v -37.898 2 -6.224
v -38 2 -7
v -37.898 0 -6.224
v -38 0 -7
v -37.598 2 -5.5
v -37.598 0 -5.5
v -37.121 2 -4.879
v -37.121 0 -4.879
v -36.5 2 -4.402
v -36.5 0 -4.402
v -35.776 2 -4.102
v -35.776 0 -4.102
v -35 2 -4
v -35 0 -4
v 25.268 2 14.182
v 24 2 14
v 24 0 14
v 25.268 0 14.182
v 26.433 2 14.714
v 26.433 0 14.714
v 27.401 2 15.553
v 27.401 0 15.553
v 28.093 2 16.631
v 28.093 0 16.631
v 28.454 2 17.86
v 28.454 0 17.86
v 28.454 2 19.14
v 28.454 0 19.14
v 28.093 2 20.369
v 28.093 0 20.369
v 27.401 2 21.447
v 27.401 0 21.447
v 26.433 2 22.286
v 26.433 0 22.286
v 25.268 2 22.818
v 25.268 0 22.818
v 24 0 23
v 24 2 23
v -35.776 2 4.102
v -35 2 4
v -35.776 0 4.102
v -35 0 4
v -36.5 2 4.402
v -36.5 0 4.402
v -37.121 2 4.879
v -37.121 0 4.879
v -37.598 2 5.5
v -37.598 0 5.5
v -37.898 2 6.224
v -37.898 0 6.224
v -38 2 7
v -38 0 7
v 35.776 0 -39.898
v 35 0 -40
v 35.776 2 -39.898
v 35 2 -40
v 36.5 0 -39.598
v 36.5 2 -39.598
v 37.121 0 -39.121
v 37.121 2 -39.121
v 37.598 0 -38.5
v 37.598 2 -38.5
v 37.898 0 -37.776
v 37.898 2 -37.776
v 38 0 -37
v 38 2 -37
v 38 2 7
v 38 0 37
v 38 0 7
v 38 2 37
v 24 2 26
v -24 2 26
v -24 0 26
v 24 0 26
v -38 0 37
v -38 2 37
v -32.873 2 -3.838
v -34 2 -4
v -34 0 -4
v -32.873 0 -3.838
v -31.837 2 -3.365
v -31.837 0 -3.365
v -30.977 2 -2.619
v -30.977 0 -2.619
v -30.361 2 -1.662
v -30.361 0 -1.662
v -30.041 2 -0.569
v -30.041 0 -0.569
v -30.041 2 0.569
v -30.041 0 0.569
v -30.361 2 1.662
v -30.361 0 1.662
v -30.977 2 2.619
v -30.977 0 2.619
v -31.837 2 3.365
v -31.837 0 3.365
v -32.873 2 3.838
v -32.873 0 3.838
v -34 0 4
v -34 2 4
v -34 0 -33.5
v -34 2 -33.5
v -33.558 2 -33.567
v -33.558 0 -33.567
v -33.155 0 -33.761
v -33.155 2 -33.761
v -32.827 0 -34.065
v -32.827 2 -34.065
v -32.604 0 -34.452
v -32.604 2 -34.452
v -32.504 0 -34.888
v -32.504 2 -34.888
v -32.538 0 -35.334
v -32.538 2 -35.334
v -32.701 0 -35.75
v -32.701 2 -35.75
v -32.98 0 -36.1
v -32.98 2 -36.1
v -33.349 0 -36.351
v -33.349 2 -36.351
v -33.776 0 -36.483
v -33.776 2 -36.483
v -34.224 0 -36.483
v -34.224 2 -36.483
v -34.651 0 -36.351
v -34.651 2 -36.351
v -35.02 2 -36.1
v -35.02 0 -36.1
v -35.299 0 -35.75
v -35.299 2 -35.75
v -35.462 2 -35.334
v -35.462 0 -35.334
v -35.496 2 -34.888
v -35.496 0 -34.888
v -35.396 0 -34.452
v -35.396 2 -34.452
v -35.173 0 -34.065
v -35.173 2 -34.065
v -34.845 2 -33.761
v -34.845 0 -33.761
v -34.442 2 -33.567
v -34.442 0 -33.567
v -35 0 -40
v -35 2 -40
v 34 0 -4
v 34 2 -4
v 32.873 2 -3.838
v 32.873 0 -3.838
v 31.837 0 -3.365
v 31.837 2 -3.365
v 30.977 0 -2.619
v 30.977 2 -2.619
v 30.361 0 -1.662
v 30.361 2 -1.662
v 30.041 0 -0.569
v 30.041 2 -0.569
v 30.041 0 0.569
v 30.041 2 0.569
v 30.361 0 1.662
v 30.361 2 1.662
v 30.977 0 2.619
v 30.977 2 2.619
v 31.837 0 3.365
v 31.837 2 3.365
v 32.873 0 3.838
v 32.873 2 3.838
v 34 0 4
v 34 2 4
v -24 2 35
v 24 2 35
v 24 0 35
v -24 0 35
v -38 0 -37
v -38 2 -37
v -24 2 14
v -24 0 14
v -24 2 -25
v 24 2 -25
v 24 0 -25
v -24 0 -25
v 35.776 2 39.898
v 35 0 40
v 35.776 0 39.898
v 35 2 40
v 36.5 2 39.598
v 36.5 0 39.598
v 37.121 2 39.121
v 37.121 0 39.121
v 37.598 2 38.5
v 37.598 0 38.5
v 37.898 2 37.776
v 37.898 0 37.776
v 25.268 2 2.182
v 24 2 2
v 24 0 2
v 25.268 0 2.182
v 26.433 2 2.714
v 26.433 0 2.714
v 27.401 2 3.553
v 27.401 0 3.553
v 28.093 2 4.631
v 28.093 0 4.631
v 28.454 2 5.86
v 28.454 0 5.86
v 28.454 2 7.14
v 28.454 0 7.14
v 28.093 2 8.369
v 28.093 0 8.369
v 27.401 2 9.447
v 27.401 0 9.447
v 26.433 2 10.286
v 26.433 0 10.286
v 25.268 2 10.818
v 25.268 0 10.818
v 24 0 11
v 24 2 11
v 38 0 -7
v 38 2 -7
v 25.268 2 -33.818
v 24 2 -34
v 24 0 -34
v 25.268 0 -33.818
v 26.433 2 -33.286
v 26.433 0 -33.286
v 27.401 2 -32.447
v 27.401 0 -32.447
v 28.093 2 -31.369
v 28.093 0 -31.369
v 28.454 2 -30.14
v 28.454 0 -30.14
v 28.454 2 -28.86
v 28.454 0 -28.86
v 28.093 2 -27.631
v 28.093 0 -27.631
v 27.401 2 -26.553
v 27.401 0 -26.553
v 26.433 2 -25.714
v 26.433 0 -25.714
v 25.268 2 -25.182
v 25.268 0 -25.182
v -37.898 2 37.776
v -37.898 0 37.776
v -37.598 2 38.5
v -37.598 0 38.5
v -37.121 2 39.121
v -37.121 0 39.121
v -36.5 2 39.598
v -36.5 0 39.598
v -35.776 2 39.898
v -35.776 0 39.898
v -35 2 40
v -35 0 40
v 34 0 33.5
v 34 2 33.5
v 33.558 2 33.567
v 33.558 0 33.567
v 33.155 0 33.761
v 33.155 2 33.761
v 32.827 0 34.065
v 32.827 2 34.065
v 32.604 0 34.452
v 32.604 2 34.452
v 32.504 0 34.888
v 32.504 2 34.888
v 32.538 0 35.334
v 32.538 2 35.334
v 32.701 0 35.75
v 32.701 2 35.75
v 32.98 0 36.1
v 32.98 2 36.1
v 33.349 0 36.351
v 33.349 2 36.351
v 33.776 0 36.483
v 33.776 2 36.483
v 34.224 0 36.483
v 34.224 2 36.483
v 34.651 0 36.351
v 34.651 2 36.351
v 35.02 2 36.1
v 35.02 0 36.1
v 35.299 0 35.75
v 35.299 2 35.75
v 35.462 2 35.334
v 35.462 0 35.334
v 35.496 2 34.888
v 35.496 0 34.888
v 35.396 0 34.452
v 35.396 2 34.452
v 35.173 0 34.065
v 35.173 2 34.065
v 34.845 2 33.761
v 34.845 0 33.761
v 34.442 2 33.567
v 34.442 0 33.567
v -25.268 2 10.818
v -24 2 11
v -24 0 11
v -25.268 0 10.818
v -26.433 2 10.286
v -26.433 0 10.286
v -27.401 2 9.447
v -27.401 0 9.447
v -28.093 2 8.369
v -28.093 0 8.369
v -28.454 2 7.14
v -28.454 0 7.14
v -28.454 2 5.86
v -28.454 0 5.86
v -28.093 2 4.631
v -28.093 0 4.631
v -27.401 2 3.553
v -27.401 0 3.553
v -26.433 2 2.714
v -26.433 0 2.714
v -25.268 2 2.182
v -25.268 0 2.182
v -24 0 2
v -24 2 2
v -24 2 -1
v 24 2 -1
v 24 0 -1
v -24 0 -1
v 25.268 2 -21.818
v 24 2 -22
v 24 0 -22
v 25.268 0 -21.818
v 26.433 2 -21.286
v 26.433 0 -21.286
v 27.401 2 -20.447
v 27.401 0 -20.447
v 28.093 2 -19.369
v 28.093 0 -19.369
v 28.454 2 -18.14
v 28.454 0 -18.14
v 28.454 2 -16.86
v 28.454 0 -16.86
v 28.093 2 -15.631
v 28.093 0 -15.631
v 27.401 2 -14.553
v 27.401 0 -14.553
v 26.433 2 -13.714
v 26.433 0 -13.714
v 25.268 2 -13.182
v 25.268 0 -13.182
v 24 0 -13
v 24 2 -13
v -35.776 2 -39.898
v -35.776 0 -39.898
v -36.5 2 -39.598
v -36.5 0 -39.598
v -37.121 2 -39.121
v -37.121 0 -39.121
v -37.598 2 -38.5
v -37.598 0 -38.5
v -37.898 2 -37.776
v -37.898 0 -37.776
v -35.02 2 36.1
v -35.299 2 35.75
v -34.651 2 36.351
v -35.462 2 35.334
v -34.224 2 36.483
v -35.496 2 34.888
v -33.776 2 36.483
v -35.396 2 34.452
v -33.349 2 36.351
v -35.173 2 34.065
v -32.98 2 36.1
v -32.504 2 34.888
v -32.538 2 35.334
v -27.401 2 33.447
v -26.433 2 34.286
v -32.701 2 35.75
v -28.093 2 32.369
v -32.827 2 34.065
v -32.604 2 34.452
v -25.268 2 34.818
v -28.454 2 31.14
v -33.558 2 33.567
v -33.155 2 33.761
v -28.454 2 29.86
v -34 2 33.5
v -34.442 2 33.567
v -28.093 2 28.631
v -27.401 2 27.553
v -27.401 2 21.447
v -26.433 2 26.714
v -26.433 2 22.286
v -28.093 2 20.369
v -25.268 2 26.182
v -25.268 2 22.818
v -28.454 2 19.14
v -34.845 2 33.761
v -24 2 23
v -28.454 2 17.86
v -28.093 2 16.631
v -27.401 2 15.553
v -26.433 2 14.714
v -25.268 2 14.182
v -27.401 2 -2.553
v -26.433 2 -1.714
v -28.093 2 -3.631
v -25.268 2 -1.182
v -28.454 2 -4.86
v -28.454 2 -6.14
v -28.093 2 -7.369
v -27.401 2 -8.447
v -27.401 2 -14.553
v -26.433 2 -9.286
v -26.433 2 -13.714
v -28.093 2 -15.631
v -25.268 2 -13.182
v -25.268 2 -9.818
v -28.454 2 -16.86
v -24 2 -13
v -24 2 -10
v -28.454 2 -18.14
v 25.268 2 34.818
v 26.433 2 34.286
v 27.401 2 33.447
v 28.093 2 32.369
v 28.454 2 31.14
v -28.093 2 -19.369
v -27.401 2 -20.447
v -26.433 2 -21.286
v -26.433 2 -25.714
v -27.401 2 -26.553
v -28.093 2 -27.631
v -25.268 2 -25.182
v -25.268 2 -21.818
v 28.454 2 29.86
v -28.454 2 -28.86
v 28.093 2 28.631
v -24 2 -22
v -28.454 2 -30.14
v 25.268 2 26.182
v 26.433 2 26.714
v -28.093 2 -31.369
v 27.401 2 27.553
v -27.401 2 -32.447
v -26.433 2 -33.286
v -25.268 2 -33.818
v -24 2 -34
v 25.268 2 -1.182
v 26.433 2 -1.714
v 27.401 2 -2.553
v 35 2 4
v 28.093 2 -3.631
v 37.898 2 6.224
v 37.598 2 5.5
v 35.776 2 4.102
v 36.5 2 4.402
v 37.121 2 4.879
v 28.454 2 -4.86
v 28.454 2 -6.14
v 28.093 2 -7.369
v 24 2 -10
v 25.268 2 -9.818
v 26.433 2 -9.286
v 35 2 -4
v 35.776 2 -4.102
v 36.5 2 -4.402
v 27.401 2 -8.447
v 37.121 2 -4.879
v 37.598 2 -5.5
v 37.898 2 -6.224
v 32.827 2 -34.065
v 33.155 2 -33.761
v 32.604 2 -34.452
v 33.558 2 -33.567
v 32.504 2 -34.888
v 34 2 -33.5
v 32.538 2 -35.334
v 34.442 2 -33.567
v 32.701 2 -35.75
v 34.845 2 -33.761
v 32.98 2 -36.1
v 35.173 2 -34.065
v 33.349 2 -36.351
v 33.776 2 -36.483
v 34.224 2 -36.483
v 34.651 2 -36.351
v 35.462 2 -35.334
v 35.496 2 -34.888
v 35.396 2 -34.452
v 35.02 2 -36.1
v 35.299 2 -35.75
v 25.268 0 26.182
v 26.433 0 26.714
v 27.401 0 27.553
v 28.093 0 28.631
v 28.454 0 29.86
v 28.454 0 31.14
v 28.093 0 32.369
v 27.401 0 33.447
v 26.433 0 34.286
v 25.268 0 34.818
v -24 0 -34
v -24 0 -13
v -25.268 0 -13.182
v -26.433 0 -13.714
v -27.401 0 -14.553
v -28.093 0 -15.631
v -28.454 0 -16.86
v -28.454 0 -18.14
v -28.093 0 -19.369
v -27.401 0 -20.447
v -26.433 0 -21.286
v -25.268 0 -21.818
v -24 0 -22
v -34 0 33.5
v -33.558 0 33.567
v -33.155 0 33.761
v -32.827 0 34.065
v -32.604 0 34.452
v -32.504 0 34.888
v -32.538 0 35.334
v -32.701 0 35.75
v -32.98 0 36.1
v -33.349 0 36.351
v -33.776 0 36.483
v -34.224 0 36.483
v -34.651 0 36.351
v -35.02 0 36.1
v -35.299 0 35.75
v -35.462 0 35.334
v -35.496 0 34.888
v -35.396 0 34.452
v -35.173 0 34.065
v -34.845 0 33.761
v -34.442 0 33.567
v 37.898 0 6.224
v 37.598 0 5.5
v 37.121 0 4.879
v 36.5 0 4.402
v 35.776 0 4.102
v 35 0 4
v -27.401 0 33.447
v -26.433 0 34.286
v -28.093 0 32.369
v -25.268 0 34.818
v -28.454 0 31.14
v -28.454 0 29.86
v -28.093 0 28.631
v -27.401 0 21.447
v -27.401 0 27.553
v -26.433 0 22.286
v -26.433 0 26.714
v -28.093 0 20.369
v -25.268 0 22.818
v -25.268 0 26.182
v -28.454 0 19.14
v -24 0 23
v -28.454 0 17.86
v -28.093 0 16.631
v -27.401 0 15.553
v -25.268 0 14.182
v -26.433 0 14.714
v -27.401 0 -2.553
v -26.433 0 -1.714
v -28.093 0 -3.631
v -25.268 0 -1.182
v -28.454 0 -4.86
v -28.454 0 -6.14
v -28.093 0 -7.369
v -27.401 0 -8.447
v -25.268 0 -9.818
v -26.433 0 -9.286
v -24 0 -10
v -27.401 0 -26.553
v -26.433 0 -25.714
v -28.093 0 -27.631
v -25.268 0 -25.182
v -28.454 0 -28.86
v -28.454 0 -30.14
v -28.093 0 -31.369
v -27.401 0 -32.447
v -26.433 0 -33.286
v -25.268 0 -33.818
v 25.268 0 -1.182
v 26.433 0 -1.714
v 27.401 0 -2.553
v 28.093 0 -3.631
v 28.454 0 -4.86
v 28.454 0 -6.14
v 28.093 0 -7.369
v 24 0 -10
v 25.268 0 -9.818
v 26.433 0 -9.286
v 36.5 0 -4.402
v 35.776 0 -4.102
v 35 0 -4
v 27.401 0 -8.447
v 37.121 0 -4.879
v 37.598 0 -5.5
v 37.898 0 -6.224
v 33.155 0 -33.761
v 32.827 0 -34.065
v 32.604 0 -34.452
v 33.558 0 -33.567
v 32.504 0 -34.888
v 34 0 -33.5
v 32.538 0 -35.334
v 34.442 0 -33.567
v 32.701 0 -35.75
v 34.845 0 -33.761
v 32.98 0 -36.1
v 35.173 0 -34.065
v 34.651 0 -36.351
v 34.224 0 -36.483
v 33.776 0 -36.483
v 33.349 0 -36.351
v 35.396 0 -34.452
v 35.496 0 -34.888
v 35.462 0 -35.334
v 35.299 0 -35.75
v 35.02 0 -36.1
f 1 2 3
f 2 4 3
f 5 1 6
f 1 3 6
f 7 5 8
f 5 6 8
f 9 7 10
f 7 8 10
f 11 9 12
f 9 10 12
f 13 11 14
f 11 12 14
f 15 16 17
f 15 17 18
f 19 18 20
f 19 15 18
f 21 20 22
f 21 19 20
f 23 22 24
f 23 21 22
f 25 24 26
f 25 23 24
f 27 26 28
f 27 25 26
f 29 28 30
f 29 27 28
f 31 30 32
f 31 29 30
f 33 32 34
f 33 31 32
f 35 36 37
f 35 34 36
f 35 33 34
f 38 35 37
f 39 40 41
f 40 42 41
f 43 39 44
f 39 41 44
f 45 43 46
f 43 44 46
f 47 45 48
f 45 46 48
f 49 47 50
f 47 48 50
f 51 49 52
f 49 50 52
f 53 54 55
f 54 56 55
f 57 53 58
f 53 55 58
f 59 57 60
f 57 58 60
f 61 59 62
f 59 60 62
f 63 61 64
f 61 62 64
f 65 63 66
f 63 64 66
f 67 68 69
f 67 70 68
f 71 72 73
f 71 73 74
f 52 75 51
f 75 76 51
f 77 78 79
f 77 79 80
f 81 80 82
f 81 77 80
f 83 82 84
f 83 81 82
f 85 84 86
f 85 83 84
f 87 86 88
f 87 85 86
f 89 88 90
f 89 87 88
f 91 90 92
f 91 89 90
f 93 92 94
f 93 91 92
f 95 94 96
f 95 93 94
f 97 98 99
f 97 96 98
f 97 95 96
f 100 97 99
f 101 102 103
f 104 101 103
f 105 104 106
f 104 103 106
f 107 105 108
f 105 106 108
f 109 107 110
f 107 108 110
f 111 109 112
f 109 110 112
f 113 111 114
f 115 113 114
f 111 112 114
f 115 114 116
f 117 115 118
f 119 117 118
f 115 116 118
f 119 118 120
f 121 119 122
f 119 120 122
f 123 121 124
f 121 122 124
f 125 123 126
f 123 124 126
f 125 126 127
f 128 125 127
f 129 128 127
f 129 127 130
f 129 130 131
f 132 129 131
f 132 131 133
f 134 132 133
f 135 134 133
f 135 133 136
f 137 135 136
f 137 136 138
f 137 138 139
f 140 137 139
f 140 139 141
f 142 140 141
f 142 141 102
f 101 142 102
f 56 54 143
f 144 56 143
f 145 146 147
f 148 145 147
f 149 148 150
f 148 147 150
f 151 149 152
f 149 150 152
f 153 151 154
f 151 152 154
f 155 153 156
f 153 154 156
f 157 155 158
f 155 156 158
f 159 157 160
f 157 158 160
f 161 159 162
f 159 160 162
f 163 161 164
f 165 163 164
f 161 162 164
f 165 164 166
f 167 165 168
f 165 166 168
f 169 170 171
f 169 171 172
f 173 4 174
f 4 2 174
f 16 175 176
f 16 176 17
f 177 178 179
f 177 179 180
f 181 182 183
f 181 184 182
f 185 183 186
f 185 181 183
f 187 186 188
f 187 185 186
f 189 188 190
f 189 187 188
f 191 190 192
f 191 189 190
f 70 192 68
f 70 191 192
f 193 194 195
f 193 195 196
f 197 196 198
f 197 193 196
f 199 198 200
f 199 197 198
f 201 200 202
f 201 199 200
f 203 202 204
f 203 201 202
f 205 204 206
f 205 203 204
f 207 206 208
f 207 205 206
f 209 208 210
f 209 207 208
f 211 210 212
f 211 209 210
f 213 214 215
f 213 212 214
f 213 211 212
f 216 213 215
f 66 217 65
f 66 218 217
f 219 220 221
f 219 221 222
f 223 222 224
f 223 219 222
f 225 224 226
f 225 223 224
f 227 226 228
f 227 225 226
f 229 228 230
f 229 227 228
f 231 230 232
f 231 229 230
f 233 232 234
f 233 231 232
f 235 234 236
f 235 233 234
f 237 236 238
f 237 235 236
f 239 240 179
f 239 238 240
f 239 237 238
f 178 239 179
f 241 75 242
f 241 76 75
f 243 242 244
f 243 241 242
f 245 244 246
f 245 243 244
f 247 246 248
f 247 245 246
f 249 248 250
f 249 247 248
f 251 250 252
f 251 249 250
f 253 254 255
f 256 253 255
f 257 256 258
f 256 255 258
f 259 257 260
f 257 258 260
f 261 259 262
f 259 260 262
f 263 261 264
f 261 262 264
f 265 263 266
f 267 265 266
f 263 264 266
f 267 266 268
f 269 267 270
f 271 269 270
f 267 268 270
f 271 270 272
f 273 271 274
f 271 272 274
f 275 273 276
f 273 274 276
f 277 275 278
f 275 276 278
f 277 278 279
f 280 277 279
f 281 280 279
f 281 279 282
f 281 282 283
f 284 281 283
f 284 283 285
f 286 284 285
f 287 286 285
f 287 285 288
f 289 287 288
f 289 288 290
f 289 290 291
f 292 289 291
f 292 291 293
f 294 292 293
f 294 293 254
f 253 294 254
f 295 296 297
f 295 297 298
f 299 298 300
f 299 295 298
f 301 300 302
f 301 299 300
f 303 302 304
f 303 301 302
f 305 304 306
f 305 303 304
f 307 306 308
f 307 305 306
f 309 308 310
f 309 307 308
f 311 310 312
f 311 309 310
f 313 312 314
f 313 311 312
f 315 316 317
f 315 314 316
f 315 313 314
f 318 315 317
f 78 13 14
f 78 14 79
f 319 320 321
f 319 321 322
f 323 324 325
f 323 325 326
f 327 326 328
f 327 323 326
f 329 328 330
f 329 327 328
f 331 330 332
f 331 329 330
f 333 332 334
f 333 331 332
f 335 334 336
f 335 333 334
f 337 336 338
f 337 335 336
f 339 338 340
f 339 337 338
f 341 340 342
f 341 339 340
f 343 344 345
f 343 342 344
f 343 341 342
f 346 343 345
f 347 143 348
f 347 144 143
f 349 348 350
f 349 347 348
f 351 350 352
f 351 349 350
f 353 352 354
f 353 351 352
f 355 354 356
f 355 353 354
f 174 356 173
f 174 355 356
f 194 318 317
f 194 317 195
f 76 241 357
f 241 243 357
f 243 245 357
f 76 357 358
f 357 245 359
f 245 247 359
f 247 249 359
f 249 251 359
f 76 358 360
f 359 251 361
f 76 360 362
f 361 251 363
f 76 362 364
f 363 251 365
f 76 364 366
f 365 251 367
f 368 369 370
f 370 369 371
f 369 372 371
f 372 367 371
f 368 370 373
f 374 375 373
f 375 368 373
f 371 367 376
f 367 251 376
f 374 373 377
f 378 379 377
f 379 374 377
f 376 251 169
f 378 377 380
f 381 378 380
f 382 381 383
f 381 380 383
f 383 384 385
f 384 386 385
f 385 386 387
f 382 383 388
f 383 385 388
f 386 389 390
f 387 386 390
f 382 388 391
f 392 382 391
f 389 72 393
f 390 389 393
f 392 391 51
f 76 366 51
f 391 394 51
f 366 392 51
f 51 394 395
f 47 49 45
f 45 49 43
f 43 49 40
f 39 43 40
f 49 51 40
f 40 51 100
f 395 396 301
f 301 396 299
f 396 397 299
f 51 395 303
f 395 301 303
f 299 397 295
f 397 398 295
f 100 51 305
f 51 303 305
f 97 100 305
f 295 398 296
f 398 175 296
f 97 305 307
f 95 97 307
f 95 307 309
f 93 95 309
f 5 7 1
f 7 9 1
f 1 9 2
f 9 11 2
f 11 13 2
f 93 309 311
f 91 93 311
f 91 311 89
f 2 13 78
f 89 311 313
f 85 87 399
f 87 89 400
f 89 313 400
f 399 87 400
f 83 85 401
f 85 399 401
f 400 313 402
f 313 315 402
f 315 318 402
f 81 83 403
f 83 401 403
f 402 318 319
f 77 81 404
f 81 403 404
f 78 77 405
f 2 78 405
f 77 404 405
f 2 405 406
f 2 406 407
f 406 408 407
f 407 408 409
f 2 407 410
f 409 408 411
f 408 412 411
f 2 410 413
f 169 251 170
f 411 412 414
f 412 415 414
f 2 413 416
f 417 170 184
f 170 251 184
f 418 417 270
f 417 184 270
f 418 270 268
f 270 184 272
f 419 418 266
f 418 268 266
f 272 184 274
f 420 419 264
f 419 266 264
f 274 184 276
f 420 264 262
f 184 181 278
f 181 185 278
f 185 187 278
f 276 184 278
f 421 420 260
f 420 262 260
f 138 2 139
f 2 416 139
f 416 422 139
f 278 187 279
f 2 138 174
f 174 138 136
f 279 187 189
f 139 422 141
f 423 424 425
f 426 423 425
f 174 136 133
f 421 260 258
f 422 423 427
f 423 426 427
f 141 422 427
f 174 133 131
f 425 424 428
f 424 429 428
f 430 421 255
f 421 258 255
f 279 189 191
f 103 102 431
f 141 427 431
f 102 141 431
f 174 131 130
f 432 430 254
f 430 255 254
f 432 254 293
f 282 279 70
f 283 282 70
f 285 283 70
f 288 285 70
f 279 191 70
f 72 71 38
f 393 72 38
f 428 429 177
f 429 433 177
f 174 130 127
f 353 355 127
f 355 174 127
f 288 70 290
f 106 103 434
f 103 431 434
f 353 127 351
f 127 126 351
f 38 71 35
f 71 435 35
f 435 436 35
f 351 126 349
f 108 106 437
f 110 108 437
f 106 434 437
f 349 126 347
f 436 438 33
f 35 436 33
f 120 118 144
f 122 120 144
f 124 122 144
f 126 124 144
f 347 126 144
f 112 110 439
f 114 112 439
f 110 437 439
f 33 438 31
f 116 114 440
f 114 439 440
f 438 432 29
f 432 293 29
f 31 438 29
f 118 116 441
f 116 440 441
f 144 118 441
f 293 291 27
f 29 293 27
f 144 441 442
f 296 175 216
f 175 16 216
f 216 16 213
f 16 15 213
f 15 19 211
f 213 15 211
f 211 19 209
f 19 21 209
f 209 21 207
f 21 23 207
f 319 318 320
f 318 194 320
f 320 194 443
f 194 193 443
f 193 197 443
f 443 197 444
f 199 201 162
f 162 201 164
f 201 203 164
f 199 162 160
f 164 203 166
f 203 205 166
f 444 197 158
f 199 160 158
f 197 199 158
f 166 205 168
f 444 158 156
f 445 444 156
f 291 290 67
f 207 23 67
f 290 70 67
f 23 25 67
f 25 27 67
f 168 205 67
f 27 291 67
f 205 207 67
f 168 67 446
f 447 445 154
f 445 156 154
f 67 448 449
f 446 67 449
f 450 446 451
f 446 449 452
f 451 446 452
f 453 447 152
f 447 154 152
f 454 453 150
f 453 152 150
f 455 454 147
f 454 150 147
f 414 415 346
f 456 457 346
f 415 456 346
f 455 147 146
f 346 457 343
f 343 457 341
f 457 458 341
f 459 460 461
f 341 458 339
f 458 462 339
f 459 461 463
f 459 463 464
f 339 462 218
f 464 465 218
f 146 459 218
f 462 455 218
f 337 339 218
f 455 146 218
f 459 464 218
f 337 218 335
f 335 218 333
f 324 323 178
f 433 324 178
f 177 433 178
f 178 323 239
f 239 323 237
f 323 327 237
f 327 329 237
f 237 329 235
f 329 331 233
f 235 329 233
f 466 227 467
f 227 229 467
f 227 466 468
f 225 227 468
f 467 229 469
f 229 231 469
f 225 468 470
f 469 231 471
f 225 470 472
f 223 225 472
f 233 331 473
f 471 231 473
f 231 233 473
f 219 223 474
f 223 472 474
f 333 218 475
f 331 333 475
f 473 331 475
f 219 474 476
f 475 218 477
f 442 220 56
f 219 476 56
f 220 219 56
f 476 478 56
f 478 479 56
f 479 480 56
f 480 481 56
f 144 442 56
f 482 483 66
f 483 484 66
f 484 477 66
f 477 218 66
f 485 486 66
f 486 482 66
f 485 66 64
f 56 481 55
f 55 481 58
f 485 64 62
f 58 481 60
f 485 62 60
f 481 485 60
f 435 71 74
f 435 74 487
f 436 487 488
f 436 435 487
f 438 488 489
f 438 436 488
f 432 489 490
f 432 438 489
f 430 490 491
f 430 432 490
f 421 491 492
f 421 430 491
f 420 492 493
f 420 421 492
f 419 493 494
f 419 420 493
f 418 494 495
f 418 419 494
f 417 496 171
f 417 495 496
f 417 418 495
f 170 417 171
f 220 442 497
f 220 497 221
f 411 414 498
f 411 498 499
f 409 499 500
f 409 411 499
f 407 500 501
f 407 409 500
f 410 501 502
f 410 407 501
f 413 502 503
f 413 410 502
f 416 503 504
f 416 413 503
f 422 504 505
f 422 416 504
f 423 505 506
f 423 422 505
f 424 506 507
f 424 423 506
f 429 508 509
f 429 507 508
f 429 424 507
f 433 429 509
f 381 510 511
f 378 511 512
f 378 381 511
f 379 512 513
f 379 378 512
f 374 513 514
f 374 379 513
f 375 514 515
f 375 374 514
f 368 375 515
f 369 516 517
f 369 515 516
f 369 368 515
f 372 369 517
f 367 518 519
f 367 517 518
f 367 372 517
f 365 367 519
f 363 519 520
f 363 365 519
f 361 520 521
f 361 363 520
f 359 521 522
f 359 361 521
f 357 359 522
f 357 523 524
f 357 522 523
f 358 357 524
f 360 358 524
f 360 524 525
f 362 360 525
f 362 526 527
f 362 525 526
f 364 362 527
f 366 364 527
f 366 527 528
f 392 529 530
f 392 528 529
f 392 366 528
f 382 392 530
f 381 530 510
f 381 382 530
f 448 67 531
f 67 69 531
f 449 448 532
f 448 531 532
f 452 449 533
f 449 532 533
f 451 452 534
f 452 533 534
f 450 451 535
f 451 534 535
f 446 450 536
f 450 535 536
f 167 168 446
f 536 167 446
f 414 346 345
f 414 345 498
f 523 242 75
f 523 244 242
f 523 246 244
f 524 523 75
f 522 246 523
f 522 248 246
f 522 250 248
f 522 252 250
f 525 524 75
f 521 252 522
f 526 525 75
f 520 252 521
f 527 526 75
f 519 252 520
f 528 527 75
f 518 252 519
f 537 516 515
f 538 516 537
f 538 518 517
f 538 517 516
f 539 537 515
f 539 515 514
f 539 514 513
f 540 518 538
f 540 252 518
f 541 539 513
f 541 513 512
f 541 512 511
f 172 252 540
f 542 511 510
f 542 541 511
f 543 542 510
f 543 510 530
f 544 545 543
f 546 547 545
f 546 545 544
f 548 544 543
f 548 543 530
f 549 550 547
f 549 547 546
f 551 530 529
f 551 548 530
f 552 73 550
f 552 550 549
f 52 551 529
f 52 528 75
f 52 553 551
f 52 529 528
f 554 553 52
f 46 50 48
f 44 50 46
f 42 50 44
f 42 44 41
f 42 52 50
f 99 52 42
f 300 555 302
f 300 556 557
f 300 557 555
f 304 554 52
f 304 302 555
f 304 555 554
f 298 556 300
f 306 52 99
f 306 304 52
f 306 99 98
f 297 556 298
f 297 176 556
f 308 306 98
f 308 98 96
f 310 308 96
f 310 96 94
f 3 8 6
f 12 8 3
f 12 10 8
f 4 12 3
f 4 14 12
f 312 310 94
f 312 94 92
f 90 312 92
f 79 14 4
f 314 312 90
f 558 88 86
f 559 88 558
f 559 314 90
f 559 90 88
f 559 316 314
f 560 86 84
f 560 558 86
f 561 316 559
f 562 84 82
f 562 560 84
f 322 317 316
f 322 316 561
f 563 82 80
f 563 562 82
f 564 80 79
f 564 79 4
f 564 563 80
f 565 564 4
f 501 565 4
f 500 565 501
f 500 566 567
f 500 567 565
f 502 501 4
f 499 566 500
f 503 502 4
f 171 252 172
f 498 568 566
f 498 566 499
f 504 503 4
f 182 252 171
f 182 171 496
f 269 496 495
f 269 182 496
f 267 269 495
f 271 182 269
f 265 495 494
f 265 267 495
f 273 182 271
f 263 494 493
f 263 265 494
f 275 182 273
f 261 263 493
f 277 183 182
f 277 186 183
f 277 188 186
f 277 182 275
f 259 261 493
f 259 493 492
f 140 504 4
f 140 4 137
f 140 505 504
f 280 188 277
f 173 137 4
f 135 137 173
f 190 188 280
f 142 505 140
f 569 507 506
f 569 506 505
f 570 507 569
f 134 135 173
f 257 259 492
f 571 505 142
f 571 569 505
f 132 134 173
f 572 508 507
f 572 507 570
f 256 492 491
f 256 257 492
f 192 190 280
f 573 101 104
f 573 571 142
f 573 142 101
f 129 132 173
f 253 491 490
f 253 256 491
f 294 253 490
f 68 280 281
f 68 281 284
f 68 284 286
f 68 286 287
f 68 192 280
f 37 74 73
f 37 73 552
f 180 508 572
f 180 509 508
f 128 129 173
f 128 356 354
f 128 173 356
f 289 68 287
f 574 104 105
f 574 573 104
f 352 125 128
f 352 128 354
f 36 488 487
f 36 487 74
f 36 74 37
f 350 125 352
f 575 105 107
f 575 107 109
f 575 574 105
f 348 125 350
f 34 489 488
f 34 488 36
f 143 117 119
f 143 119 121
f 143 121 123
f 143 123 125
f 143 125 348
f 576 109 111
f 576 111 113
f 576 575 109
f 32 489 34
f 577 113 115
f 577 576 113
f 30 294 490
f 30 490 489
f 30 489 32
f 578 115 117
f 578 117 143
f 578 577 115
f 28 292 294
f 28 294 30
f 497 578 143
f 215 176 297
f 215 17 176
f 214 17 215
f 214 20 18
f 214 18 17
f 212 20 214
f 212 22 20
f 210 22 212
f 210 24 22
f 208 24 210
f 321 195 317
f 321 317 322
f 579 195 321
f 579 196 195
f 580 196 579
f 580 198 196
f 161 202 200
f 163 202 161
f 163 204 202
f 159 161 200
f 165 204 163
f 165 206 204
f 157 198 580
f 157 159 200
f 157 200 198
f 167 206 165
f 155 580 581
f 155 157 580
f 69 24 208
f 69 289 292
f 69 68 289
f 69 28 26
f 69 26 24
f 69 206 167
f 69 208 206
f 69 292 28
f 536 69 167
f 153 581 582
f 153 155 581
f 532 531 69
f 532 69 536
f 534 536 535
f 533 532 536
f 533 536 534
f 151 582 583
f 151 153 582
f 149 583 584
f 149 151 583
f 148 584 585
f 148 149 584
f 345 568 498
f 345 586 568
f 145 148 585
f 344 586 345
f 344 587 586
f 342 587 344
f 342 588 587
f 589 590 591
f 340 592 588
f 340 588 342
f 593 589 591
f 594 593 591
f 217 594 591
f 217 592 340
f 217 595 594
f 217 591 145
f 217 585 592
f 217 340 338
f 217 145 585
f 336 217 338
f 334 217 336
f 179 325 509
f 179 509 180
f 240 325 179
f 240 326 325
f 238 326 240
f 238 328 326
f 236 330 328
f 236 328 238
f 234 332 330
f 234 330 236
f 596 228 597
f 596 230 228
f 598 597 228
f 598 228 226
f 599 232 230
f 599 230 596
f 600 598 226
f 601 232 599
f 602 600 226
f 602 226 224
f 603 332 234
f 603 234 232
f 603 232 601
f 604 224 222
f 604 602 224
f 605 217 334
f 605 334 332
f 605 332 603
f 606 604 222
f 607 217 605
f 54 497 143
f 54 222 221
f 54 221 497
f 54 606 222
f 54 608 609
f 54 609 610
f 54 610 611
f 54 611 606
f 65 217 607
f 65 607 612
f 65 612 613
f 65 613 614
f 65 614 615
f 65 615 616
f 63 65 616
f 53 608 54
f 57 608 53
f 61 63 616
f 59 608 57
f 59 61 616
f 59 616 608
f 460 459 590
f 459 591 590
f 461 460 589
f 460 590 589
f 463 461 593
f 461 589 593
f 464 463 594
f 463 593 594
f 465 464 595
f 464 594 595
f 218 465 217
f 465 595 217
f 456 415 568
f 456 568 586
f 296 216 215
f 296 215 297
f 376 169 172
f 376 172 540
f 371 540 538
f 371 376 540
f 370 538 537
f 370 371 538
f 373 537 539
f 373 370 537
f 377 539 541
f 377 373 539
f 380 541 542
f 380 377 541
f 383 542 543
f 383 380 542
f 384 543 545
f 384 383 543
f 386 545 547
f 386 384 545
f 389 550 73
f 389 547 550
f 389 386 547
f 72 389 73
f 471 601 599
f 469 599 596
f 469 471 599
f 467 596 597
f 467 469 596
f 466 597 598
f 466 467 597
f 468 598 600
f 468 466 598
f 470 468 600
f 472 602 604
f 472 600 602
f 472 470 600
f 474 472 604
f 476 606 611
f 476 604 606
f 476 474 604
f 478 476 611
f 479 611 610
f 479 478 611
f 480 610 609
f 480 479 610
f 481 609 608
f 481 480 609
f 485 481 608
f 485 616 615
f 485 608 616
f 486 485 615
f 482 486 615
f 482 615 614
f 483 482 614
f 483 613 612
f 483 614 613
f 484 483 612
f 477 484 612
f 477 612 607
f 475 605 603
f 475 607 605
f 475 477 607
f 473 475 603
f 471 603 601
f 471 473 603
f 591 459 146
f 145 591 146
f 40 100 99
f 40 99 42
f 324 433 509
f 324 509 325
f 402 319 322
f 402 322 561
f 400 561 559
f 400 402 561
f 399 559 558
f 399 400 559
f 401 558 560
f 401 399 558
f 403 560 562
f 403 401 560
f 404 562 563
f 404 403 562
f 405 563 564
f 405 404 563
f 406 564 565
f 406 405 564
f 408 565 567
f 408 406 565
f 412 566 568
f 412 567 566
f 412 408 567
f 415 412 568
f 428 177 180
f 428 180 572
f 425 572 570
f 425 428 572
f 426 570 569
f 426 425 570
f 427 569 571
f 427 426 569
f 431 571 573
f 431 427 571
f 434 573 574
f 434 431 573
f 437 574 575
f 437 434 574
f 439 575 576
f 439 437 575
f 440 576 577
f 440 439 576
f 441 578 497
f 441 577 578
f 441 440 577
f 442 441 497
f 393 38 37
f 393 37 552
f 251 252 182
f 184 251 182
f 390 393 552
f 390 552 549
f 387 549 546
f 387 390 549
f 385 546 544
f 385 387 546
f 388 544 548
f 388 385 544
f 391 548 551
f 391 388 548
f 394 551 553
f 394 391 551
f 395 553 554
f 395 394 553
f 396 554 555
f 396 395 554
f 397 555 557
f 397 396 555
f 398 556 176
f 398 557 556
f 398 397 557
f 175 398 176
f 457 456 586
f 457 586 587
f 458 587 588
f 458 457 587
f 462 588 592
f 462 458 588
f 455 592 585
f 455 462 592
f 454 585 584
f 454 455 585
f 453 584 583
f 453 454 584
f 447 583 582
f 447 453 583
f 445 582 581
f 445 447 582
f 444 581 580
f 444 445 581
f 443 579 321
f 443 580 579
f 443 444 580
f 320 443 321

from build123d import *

# Parameters (mm, degrees)
EXTRUDE_1_DEPTH          = 2
SKETCH_2_R               = 1.5
CUT_EXTRUDE_1_DEPTH      = 56.208694967
MIRROR_2_COPY_1_SKETCH_R = 1.5
MIRROR_2_COPY_1_DEPTH    = 56.208694967
CUT_EXTRUDE_2_DEPTH      = 56.208694967
PATTERN_LINEAR_1_COUNT   = 6
PATTERN_LINEAR_1_PITCH   = 12
SKETCH_4_W               = 60
SKETCH_4_H               = 2
EXTRUDE_2_DEPTH          = 8
CUT_EXTRUDE_3_DEPTH      = 56.208694967
FILLET_1_R               = 3


with BuildPart() as part:
    # 草图1 → 凸台-拉伸1 (new body)
    with BuildSketch(Plane(origin=(0, 0, 0), x_dir=(1, 0, 0), z_dir=(0, 1, 0))):
        Polygon((-38, -30), (-38, -40), (38, -40), (38, -30), (30, -30), (30, 30), (38, 30), (38, 40), (-38, 40), (-38, 30), (-30, 30), (-30, -30), align=None)
    extrude(amount=EXTRUDE_1_DEPTH)

    # 草图2 → 切除-拉伸1 (cut, through all)
    with BuildSketch(Plane(origin=(0, 2, 0), x_dir=(1, 0, 0), z_dir=(0, 1, 0))):
        with Locations(Location((-34, 35, 0), (0, 0, 270))):
            Circle(SKETCH_2_R)
    cut_extrude_1 = extrude(amount=-CUT_EXTRUDE_1_DEPTH, mode=Mode.SUBTRACT)

    # 镜向1: 切除-拉伸1 across plane
    add(cut_extrude_1.mirror(Plane(origin=(0, 0, 0), x_dir=(0, 0, 1), z_dir=(1, 0, 0))), mode=Mode.SUBTRACT)

    # 镜向2: 切除-拉伸1 across plane
    add(cut_extrude_1.mirror(Plane.XY), mode=Mode.SUBTRACT)

    # 镜向2 copy 1 sketch → 镜向2 copy 1 (cut, through all)
    with BuildSketch(Plane(origin=(0, 2, 0), x_dir=(-1, 0, 0), z_dir=(0, 1, 0))):
        with Locations(Location((-34, 35, 0), (0, 0, 270))):
            Circle(MIRROR_2_COPY_1_SKETCH_R)
    extrude(amount=-MIRROR_2_COPY_1_DEPTH, mode=Mode.SUBTRACT)

    # 草图3 → 切除-拉伸2 (cut, through all)
    with BuildSketch(Plane(origin=(0, 2, 0), x_dir=(1, 0, 0), z_dir=(0, 1, 0))):
        with BuildLine():
            Line((-24, 34), (24, 34))
            ThreePointArc((24, 34), (28.5, 29.5), (24, 25))
            Line((24, 25), (-24, 25))
            ThreePointArc((-24, 25), (-28.5, 29.5), (-24, 34))
        make_face()
    cut_extrude_2 = extrude(amount=-CUT_EXTRUDE_2_DEPTH, mode=Mode.SUBTRACT)

    # 阵列(线性)1: 切除-拉伸2 ×6
    with Locations(*[(0, 0, i * PATTERN_LINEAR_1_PITCH) for i in range(1, PATTERN_LINEAR_1_COUNT)]):
        add(cut_extrude_2, mode=Mode.SUBTRACT)

    # 草图4 → 凸台-拉伸2 (add)
    with BuildSketch(Plane(origin=(30, 0, 0), x_dir=(0, 0, -1), z_dir=(1, 0, 0))):
        with Locations((0, 1)):
            Rectangle(SKETCH_4_W, SKETCH_4_H)
    extrude_2 = extrude(amount=EXTRUDE_2_DEPTH)

    # 镜向3: 凸台-拉伸2 across plane
    add(extrude_2.mirror(Plane(origin=(0, 0, 0), x_dir=(0, 0, 1), z_dir=(1, 0, 0))))

    # 草图6 → 切除-拉伸3 (cut, through all)
    with BuildSketch(Plane(origin=(0, 2, 0), x_dir=(1, 0, 0), z_dir=(0, 1, 0))):
        with BuildLine():
            Line((-38, 4), (-34, 4))
            ThreePointArc((-34, 4), (-30, 0), (-34, -4))
            Line((-34, -4), (-38, -4))
            Line((-38, -4), (-38, 4))
        make_face()
        with BuildLine():
            Line((38, -4), (38, 4))
            Line((38, 4), (34, 4))
            ThreePointArc((34, 4), (30, 0), (34, -4))
            Line((34, -4), (38, -4))
        make_face()
    extrude(amount=-CUT_EXTRUDE_3_DEPTH, mode=Mode.SUBTRACT)

    # 圆角1
    fillet_1_edges = [part.edges().sort_by_distance(p)[0] for p in [
        (-38, 1, 4),
        (-38, 1, -4),
        (38, 1, -4),
        (38, 1, 4),
        (38, 1, 40),
        (-38, 1, 40),
        (-38, 1, -40),
        (38, 1, -40),
    ]]
    fillet(fillet_1_edges, radius=FILLET_1_R)


solid = part.part
